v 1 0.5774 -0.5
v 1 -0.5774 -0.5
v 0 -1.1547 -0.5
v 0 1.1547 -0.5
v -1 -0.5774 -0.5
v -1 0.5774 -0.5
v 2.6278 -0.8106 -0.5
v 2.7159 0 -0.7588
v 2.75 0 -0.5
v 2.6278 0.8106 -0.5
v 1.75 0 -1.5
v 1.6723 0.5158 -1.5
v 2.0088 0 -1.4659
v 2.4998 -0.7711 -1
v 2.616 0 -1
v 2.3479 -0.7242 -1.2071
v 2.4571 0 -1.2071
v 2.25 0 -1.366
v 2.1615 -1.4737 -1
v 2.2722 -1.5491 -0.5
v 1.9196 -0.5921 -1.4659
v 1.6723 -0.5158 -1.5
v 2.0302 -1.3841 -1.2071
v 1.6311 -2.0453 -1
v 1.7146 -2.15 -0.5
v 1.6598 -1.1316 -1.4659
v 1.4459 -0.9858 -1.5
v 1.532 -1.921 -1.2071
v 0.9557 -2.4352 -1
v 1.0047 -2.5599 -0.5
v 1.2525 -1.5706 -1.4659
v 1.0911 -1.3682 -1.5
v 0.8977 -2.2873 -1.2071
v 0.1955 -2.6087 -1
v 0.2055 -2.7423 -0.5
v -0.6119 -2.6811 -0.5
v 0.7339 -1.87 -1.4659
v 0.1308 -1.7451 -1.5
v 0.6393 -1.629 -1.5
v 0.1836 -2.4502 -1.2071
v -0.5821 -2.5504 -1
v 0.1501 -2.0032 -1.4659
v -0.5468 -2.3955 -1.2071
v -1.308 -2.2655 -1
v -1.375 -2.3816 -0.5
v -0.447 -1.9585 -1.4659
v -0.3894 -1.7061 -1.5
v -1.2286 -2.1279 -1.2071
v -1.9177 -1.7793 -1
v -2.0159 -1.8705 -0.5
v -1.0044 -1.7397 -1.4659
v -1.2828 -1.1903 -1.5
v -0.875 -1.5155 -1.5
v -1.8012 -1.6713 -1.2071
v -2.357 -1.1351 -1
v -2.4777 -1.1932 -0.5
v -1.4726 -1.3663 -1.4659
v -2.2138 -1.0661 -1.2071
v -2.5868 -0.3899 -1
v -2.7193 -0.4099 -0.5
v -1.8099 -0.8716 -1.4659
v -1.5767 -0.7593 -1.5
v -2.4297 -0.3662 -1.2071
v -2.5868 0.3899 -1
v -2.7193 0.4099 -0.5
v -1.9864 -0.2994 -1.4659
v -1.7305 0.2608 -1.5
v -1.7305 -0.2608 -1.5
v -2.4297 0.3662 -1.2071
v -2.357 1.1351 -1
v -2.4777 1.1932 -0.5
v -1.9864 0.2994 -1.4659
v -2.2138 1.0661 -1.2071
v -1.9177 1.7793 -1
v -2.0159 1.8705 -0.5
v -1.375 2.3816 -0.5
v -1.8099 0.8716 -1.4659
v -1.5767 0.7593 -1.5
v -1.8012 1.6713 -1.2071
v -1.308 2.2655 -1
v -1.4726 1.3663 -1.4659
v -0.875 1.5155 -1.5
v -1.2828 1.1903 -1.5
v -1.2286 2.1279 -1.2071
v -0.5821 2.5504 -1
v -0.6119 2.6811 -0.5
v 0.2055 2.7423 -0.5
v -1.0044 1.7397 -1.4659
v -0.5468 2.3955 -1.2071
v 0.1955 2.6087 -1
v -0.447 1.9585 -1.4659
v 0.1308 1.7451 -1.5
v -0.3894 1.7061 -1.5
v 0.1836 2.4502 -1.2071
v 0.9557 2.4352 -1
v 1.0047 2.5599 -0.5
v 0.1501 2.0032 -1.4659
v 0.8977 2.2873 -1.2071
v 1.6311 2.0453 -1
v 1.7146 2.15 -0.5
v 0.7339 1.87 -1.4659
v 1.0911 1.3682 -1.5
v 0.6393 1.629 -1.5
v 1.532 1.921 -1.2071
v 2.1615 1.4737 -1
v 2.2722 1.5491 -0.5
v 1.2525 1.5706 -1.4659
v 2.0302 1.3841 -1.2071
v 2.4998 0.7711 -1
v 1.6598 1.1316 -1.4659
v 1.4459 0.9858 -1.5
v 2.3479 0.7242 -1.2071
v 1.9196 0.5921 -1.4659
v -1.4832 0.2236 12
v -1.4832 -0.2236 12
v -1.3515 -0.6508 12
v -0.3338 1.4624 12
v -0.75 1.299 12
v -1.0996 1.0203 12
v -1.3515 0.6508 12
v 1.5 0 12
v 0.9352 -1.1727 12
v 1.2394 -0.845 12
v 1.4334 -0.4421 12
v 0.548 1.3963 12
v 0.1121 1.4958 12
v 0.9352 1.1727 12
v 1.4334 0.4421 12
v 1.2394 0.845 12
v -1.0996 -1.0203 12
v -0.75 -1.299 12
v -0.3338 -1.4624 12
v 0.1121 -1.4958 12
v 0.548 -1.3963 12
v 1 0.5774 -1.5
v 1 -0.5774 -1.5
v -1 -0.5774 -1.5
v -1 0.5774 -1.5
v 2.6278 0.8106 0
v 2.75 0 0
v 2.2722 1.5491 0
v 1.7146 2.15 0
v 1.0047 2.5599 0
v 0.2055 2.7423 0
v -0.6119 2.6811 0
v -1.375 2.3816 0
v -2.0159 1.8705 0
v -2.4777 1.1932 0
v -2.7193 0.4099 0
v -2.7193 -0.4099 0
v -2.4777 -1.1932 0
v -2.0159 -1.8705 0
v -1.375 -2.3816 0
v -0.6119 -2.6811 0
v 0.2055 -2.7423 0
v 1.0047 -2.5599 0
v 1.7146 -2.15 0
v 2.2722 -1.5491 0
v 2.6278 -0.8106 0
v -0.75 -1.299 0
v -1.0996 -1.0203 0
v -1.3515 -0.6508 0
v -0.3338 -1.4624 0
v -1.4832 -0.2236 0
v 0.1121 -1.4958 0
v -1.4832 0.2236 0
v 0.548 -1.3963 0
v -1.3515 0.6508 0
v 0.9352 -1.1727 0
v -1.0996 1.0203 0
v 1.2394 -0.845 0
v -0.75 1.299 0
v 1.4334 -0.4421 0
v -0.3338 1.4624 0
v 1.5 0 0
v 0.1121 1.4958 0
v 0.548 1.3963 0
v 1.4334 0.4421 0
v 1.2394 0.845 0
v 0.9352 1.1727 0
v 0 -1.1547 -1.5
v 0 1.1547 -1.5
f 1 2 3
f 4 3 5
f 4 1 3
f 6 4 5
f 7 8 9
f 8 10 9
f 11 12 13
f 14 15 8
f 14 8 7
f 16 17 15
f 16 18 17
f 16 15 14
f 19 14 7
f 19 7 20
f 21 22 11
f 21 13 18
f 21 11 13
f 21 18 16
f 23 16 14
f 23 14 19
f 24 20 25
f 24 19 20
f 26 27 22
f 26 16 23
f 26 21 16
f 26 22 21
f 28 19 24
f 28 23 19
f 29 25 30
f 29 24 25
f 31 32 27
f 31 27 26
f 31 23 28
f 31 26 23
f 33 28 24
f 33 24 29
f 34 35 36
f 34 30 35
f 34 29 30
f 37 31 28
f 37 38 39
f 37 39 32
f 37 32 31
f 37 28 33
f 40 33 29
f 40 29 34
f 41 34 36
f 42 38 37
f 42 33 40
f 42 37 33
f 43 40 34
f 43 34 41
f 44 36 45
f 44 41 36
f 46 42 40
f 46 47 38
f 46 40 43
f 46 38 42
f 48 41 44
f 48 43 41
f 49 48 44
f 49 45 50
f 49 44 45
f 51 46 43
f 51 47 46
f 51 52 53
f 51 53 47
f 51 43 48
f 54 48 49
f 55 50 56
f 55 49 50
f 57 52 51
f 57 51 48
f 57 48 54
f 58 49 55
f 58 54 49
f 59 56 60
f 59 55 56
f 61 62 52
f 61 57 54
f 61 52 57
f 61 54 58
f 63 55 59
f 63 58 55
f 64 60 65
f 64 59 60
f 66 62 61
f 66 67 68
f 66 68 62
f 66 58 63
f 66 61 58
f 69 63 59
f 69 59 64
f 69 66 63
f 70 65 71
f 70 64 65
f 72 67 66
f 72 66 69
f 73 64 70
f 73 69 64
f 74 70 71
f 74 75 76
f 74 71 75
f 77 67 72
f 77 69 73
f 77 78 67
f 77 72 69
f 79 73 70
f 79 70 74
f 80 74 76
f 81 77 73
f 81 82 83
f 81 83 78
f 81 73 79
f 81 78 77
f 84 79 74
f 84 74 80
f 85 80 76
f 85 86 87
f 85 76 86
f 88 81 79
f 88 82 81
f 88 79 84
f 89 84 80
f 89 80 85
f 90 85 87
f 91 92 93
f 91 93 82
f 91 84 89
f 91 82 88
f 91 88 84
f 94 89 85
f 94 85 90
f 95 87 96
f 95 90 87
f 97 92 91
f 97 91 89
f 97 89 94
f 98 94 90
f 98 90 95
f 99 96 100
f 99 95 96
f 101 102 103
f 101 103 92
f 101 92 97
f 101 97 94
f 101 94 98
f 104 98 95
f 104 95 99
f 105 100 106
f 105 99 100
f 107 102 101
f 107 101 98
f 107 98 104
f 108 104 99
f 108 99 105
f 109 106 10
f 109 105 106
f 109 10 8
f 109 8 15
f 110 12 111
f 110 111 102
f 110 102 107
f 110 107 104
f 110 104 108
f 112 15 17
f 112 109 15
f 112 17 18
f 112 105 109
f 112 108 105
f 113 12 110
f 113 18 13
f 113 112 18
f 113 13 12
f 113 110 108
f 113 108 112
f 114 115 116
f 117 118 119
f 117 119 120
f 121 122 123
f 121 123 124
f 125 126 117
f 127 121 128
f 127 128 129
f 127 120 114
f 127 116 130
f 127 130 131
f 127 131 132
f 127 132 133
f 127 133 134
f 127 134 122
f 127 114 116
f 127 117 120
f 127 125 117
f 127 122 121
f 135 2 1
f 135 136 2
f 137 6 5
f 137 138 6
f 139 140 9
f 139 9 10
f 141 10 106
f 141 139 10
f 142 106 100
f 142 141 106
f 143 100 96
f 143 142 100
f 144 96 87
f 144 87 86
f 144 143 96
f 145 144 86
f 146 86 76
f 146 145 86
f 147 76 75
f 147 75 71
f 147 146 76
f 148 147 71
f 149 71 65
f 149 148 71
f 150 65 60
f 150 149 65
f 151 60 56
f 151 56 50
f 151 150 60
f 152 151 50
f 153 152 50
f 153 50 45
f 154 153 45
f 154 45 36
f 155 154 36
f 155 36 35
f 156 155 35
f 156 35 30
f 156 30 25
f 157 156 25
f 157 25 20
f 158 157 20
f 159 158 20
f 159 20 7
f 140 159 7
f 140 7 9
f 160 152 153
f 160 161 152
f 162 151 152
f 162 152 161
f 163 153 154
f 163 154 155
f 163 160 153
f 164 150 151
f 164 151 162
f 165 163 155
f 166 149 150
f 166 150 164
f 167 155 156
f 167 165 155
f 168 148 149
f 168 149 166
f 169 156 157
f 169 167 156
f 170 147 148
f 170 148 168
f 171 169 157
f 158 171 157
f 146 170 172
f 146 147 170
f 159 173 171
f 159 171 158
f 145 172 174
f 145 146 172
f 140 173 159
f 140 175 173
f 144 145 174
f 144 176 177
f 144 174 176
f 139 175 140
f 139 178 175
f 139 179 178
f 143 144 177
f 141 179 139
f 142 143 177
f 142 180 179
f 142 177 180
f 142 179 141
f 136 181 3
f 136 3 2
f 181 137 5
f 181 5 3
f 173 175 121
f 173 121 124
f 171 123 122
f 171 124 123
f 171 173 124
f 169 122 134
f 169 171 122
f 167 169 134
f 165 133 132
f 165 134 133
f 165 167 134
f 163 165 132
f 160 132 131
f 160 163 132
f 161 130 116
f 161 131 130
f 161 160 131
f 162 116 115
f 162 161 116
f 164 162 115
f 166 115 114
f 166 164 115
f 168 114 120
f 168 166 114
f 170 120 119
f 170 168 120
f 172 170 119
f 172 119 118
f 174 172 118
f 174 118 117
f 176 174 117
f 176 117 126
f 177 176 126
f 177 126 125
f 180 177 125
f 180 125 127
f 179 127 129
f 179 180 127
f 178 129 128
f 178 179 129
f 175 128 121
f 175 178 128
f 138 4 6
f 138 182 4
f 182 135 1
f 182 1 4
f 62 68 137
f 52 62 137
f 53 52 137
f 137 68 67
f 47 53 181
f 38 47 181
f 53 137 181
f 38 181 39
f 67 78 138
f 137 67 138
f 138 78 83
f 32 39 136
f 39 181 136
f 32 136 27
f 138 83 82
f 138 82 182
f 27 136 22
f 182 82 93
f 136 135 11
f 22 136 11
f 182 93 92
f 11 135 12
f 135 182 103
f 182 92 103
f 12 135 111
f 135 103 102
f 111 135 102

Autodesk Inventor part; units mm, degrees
ref_plane "YZ Plane" through (0, 0, 0) normal (1, 0, 0) x (0, 1, 0)
ref_plane "XZ Plane" through (0, 0, 0) normal (0, 1, 0) x (-1, 0, 0)
ref_plane "XY Plane" through (0, 0, 0) normal (0, 0, 1) x (1, 0, 0)
sketch "Эскиз1" plane through (0, 0, 0) normal (0, 0, 1) x (1, 0, 0)
  circle A0 centre (0, 0) radius 1.5
  circle A1 centre (0, 0) radius 2.75
  dimension "d0" = 5.5
  dimension "d1" = 3
extrude "Выдавливание1" add sketch "Эскиз1" along normal blind 12 contours A0
extrude "Выдавливание2" add sketch "Эскиз1" against normal blind 1.5 contours A0 | A1
thread "Резьба1" size "M3x0.5" class "6g" standard "ISO Metric profile" full length
sketch "Эскиз2" plane through (0, 0, -1.5) normal (0, 0, -1) x (-1, 0, 0)
  line L0 (0, 1.1547) -> (1, 0.5774)
  line L1 (1, 0.5774) -> (1, -0.5774)
  line L2 (1, -0.5774) -> (0, -1.1547)
  line L3 (0, -1.1547) -> (-1, -0.5774)
  line L4 (-1, -0.5774) -> (-1, 0.5774)
  line L5 (-1, 0.5774) -> (0, 1.1547)
  point P0 (0, 0)
  point P1 (0, 0)
  dimension "d8" = 2
extrude "Выдавливание3" cut sketch "Эскиз2" against normal blind 1
fillet "Сопряжение1" radius 1 1 edges at (-2.75, 0, -1.5)
properties part number "Болт М3"
